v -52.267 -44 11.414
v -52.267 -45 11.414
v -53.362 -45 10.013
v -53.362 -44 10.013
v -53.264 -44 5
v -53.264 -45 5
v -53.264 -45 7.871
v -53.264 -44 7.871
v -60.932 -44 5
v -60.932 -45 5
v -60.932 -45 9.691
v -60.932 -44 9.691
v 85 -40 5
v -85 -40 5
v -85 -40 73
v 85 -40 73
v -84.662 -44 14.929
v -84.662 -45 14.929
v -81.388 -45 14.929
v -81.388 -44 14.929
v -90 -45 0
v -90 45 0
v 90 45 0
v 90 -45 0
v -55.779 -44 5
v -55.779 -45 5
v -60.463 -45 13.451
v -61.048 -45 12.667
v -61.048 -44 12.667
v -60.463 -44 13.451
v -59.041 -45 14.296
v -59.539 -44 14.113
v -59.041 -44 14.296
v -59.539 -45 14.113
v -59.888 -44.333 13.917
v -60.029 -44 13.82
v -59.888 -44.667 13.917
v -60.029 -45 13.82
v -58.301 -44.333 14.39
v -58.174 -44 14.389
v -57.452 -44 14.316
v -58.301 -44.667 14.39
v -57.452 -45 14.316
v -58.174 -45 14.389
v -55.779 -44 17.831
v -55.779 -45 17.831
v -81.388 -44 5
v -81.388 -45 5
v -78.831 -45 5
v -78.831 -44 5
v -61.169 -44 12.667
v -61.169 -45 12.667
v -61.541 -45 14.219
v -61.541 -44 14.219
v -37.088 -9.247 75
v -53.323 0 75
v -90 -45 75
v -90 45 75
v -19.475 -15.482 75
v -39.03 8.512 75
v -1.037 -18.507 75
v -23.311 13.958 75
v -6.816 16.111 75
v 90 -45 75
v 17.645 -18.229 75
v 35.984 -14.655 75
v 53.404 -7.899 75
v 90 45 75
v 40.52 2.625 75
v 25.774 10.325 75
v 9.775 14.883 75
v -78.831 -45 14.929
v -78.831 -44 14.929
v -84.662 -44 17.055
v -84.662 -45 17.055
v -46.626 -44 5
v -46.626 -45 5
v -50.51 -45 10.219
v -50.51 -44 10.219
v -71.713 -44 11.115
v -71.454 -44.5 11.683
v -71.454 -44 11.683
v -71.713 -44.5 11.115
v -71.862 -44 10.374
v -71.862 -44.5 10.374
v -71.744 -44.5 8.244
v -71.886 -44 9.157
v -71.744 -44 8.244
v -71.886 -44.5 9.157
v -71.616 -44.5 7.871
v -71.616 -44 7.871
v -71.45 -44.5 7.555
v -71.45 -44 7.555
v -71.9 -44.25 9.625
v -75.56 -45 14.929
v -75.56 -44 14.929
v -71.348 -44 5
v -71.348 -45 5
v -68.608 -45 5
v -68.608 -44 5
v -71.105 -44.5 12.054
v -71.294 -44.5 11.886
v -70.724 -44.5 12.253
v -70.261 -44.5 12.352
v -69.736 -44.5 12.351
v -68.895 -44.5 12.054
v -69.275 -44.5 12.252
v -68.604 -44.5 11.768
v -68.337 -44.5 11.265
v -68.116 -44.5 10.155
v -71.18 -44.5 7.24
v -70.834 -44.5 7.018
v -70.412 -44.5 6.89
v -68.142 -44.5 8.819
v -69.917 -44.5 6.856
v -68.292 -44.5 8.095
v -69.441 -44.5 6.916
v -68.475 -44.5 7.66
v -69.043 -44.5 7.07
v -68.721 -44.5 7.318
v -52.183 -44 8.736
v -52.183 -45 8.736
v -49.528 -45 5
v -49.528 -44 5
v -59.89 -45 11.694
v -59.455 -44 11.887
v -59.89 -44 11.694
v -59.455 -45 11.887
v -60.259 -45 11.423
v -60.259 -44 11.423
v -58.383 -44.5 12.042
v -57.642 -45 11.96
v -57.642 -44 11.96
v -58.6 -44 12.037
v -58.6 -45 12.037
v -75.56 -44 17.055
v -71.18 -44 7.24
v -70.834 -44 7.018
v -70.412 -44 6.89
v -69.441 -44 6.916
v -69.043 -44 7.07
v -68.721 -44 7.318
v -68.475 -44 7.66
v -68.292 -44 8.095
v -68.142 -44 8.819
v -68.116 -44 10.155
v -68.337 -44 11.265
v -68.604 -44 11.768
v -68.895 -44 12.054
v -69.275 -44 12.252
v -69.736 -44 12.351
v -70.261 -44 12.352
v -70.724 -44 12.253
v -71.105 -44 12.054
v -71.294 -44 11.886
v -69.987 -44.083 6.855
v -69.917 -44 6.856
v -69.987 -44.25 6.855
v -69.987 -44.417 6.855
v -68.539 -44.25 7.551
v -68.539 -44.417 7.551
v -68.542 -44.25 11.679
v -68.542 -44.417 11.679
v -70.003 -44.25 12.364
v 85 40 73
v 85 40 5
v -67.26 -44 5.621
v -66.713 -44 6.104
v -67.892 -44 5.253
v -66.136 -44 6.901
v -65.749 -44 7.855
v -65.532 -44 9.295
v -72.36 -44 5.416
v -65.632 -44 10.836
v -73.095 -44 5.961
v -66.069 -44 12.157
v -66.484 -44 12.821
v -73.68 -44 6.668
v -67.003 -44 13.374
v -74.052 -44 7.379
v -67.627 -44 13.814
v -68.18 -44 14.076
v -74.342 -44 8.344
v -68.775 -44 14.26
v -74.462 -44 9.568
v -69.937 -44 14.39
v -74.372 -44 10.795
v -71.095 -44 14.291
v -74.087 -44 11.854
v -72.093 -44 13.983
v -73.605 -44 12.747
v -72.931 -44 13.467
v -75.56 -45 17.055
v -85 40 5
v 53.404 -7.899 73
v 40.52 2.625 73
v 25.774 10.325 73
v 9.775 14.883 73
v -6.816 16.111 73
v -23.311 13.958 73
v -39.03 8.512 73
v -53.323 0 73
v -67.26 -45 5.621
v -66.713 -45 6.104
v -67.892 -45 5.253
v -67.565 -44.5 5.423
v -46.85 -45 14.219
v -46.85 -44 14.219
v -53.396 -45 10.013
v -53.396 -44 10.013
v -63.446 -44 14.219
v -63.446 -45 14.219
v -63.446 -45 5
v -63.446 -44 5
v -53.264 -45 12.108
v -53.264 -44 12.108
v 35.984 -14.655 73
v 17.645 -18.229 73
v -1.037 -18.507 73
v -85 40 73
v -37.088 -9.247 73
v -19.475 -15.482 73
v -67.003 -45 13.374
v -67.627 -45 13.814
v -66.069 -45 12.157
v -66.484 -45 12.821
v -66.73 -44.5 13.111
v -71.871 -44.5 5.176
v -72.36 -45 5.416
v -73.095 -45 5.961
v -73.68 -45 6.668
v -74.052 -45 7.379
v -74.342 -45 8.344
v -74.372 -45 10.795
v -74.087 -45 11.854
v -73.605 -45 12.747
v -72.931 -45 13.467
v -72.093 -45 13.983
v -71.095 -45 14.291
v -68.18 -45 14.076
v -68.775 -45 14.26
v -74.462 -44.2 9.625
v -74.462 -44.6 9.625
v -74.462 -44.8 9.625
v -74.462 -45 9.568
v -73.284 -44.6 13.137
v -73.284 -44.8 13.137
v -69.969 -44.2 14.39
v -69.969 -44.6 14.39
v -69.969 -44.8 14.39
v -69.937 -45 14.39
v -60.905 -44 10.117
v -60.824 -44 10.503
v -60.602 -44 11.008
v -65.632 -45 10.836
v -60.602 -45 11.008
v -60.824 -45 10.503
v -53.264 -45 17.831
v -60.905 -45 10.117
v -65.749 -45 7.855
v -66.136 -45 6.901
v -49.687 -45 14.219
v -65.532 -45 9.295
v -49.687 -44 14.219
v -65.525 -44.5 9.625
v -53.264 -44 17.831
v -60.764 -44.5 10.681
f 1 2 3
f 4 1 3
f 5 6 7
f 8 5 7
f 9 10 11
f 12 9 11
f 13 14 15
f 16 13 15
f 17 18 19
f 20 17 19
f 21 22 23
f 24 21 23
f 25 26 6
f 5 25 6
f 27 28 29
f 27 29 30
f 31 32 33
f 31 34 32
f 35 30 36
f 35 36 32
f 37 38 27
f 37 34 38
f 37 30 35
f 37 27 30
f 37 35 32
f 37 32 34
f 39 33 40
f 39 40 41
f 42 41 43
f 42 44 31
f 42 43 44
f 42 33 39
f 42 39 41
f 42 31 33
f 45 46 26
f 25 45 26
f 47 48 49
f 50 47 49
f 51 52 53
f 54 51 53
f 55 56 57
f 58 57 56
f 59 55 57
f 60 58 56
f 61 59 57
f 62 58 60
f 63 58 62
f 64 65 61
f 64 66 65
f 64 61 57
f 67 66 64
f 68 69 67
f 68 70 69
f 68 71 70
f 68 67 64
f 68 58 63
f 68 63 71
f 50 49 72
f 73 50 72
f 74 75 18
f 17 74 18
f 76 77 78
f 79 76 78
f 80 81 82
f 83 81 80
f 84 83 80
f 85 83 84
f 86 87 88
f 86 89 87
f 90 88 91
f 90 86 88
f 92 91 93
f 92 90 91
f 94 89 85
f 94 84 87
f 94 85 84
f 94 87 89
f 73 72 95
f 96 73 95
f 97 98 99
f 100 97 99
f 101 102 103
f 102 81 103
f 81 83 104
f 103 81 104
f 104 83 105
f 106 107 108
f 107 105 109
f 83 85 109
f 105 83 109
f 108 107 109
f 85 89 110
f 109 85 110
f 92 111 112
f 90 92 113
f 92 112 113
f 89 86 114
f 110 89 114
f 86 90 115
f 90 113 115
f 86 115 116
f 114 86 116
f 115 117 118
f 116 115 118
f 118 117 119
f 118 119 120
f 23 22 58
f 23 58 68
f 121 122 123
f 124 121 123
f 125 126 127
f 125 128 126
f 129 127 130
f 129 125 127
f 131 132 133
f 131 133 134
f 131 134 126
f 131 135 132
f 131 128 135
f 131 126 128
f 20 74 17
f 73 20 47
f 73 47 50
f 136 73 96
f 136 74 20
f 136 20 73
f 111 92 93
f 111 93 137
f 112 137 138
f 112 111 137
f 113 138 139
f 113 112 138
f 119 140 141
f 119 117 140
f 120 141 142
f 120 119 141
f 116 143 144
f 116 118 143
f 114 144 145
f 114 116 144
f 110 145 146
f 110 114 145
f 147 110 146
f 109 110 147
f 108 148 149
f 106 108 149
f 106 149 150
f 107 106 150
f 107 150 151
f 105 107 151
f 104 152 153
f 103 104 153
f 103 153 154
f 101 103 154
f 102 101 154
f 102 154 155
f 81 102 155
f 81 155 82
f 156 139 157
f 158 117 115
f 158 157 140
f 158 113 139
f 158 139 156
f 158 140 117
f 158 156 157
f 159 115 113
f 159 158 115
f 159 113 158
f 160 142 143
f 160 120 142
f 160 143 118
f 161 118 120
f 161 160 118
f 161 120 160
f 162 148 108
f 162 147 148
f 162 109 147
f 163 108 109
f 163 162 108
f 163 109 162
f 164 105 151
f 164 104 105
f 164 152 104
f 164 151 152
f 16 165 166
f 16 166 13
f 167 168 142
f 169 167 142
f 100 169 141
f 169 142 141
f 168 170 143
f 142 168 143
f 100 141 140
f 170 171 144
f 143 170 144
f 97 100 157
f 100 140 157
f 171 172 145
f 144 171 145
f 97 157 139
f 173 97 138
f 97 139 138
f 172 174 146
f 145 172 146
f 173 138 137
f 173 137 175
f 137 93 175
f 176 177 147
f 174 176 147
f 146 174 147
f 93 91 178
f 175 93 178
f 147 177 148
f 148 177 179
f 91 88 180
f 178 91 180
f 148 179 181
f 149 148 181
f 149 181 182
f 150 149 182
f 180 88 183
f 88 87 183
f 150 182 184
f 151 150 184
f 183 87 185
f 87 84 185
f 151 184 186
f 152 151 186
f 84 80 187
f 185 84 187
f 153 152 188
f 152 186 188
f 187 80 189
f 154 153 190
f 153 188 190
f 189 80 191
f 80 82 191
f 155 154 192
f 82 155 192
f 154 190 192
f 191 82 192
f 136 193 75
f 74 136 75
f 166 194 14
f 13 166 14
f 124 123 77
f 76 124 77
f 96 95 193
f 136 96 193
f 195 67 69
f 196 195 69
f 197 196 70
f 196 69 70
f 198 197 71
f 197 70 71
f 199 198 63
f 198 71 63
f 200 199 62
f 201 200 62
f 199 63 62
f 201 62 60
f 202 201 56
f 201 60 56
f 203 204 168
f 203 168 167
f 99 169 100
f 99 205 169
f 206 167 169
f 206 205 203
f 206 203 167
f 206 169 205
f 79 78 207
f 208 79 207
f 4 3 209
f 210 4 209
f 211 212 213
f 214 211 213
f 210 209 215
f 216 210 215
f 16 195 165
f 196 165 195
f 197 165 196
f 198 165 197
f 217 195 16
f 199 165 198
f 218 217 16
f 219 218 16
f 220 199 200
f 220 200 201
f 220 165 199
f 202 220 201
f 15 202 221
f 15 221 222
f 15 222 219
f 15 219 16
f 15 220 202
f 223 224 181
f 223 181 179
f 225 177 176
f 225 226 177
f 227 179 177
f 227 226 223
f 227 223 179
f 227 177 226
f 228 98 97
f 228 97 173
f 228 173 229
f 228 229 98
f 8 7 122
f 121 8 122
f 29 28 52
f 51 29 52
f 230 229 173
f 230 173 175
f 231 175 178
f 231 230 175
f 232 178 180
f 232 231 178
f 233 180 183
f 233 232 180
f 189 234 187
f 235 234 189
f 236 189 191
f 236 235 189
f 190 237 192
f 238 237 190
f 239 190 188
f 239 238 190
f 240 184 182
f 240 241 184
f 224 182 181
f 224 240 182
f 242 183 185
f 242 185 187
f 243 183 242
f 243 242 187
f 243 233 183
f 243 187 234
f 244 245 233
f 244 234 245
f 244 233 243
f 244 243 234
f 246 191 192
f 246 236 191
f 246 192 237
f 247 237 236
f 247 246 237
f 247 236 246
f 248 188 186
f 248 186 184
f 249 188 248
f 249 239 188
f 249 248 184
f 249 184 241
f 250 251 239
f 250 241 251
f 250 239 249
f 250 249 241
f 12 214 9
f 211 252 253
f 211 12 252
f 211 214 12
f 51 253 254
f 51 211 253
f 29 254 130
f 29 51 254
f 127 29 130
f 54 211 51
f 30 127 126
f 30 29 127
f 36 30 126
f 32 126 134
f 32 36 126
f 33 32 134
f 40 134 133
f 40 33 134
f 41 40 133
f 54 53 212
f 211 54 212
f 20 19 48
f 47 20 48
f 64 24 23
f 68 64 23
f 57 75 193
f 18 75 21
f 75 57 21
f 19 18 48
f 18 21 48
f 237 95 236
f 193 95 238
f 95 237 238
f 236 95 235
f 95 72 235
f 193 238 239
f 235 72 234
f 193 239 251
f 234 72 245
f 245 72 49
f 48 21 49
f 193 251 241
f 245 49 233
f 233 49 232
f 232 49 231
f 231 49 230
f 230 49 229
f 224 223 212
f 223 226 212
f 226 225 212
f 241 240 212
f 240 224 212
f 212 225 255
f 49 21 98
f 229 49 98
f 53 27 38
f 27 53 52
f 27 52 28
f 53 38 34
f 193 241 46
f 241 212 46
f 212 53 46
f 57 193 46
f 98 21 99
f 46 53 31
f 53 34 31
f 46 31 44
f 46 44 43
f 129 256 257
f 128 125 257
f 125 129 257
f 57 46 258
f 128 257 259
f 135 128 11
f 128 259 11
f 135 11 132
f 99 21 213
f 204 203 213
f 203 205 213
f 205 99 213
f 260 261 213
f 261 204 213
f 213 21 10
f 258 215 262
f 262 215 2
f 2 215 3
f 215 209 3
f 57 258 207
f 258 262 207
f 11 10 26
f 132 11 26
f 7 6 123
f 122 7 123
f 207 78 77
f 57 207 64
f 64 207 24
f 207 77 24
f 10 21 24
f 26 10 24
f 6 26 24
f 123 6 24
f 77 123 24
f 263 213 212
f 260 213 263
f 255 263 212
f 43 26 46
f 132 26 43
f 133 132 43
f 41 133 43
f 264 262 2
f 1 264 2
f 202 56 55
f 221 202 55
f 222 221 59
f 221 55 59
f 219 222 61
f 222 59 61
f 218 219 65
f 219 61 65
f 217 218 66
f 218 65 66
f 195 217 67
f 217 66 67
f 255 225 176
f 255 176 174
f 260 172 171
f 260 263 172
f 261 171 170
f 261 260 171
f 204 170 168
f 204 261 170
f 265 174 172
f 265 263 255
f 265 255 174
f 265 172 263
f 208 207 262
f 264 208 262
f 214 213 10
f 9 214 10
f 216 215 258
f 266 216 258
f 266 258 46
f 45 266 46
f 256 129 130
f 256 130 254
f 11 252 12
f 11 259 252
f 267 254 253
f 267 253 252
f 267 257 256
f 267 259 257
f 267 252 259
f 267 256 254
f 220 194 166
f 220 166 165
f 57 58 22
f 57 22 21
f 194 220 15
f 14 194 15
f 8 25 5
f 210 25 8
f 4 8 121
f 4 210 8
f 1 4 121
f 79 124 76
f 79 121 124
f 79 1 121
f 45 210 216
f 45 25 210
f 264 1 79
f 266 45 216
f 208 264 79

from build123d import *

# Parameters (mm, degrees)
F0_W      = 180
F0_H      = 90
F1_DEPTH  = 75
F2_W      = 80
F2_H      = 68
F3_DEPTH  = 175
F4_W      = 80
F4_H      = 68
F5_DEPTH  = 5
F7_DEPTH  = 25
F9_DEPTH  = 1
F10_DEPTH = 0.5


with BuildPart() as f1:
    # F0 (on Top) → F1 (new body)
    with BuildSketch(Plane.XY):
        Rectangle(F0_W, F0_H)
    extrude(amount=F1_DEPTH)

    # F2 (on face) → F3 (cut)
    with BuildSketch(Plane(origin=(-90, 0, 0), x_dir=(0, -1, 0), z_dir=(-1, 0, 0))):
        with Locations((0, 39)):
            Rectangle(F2_W, F2_H)
    extrude(amount=-F3_DEPTH, mode=Mode.SUBTRACT)

    # F4 (on face) → F5 (join)
    with BuildSketch(Plane(origin=(-90, 0, 0), x_dir=(0, -1, 0), z_dir=(-1, 0, 0))):
        with Locations((0, 39)):
            Rectangle(F4_W, F4_H)
    extrude(amount=-F5_DEPTH)

    # F6 (on face) → F7 (cut, symmetric)
    with BuildSketch(Plane.XY.offset(75)):
        with BuildLine():
            ThreePointArc((53.4038208425, -7.8985784203), (1.5108137294, 15.9196343033), (-53.3230871735, 0))
            ThreePointArc((-53.3230871735, 0), (-1.0370293111, -18.5072454911), (53.4038208425, -7.8985784203))
        make_face()
    extrude(amount=F7_DEPTH, both=True, mode=Mode.SUBTRACT)

    # F8 (on face) → F9 (cut)
    with BuildSketch(Plane.XZ.offset(45)):
        Polygon((-81.387918066, 14.9286104324), (-81.387918066, 5), (-78.8312283214, 5), (-78.8312283214, 14.9286104324), (-75.5595097627, 14.9286104324), (-75.5595097627, 17.0552274955), (-84.6622751074, 17.0552274955), (-84.6622751074, 14.9286104324), align=None)
        with BuildLine():
            add(Edge.make_bspline(
                [(-71.3481548896, 5), (-71.8881241204, 5.1447529863), (-72.3603494786, 5.4155610266)],
                knots=[0.5345224838, 0.5345224838, 0.5345224838, 1, 1, 1], degree=2))
            Line((-71.3481548896, 5), (-68.6078073449, 5))
            add(Edge.make_bspline(
                [(-66.7126772409, 6.1042050135), (-67.4705184641, 5.2933149046), (-68.6078073449, 5)],
                knots=[0, 0, 0, 0.6382803275, 0.6382803275, 0.6382803275], degree=2))
            add(Edge.make_bspline(
                [(-65.525360022, 9.6252601882), (-65.525360022, 7.3746344377), (-66.7126772409, 6.1042050135)],
                knots=[0, 0, 0, 1, 1, 1], degree=2))
            add(Edge.make_bspline(
                [(-66.06888746, 12.156884347), (-65.525360022, 11.0764256779), (-65.525360022, 9.6252601882)],
                knots=[0, 0, 0, 1, 1, 1], degree=2))
            add(Edge.make_bspline(
                [(-67.6269114994, 13.813851488), (-66.6124148979, 13.2373430162), (-66.06888746, 12.156884347)],
                knots=[0, 0, 0, 1, 1, 1], degree=2))
            add(Edge.make_bspline(
                [(-69.9685649032, 14.3903599599), (-68.6414081008, 14.3903599599), (-67.6269114994, 13.813851488)],
                knots=[0, 0, 0, 1, 1, 1], degree=2))
            add(Edge.make_bspline(
                [(-73.2838184266, 13.1370806733), (-72.1057358972, 14.3903599599), (-69.9685649032, 14.3903599599)],
                knots=[0, 0, 0, 1, 1, 1], degree=2))
            add(Edge.make_bspline(
                [(-74.461900956, 9.6252601882), (-74.461900956, 11.8838013867), (-73.2838184266, 13.1370806733)],
                knots=[0, 0, 0, 1, 1, 1], degree=2))
            add(Edge.make_bspline(
                [(-73.918373518, 7.0857205811), (-74.461900956, 8.1740946984), (-74.461900956, 9.6252601882)],
                knots=[0, 0, 0, 1, 1, 1], degree=2))
            add(Edge.make_bspline(
                [(-72.3603494786, 5.4155610266), (-73.37484608, 5.9973464638), (-73.918373518, 7.0857205811)],
                knots=[0, 0, 0, 1, 1, 1], degree=2))
        make_face()
        with BuildLine():
            add(Edge.make_bspline(
                [(-71.8999342459, 9.6252601882), (-71.8999342459, 8.2558876624), (-71.4500729441, 7.5553705033)],
                knots=[0, 0, 0, 1, 1, 1], degree=2))
            add(Edge.make_bspline(
                [(-71.4540306682, 11.6832767009), (-71.8999342459, 11.002548162), (-71.8999342459, 9.6252601882)],
                knots=[0, 0, 0, 1, 1, 1], degree=2))
            add(Edge.make_bspline(
                [(-70.0028651785, 12.3640052397), (-71.0081270904, 12.3640052397), (-71.4540306682, 11.6832767009)],
                knots=[0, 0, 0, 1, 1, 1], degree=2))
            add(Edge.make_bspline(
                [(-68.5424649993, 11.6793189768), (-68.9870493357, 12.3640052397), (-70.0028651785, 12.3640052397)],
                knots=[0, 0, 0, 1, 1, 1], degree=2))
            add(Edge.make_bspline(
                [(-68.0978806629, 9.6252601882), (-68.0978806629, 10.9946327139), (-68.5424649993, 11.6793189768)],
                knots=[0, 0, 0, 1, 1, 1], degree=2))
            add(Edge.make_bspline(
                [(-68.5385072752, 7.5514127792), (-68.0978806629, 8.2479722143), (-68.0978806629, 9.6252601882)],
                knots=[0, 0, 0, 1, 1, 1], degree=2))
            add(Edge.make_bspline(
                [(-69.9870342822, 6.8548533441), (-68.9791338875, 6.8548533441), (-68.5385072752, 7.5514127792)],
                knots=[0, 0, 0, 1, 1, 1], degree=2))
            add(Edge.make_bspline(
                [(-71.4500729441, 7.5553705033), (-71.0002116423, 6.8548533441), (-69.9870342822, 6.8548533441)],
                knots=[0, 0, 0, 1, 1, 1], degree=2))
        make_face(mode=Mode.SUBTRACT)
        with BuildLine():
            Line((-63.4462356476, 5), (-60.9317616263, 5))
            Line((-60.9317616263, 5), (-60.9317616263, 9.6912222559))
            add(Edge.make_bspline(
                [(-60.2589485356, 11.4233861541), (-60.9317616263, 10.8046619589), (-60.9317616263, 9.6912222559)],
                knots=[0, 0, 0, 1, 1, 1], degree=2))
            add(Edge.make_bspline(
                [(-58.3829873298, 12.0421103492), (-59.586135445, 12.0421103492), (-60.2589485356, 11.4233861541)],
                knots=[0, 0, 0, 1, 1, 1], degree=2))
            add(Edge.make_bspline(
                [(-57.6415736887, 11.9603173853), (-57.9476376829, 12.0421103492), (-58.3829873298, 12.0421103492)],
                knots=[0, 0, 0, 1, 1, 1], degree=2))
            Line((-57.6415736887, 11.9603173853), (-57.4516029337, 14.316482444))
            add(Edge.make_bspline(
                [(-58.3011943659, 14.3903599599), (-57.7893287204, 14.3903599599), (-57.4516029337, 14.316482444)],
                knots=[0, 0, 0, 1, 1, 1], degree=2))
            add(Edge.make_bspline(
                [(-59.8882417151, 13.9167523137), (-59.1587012462, 14.3903599599), (-58.3011943659, 14.3903599599)],
                knots=[0, 0, 0, 1, 1, 1], degree=2))
            add(Edge.make_bspline(
                [(-61.0478548655, 12.6674307512), (-60.617782184, 13.4431446675), (-59.8882417151, 13.9167523137)],
                knots=[0, 0, 0, 1, 1, 1], degree=2))
            Line((-61.0478548655, 12.6674307512), (-61.1692250701, 12.6674307512))
            Line((-61.1692250701, 12.6674307512), (-61.541251132, 14.2188585838))
            Line((-61.541251132, 14.2188585838), (-63.4462356476, 14.2188585838))
            Line((-63.4462356476, 14.2188585838), (-63.4462356476, 5))
        make_face()
        Polygon((-49.5282393598, 5), (-46.6259083804, 5), (-50.5097549274, 10.2189187976), (-46.8501794106, 14.2188585838), (-49.6865483223, 14.2188585838), (-52.2669844113, 11.4141514646), (-53.3619547354, 10.0131171463), (-53.3962550106, 10.0131171463), (-53.2643308752, 12.1080724169), (-53.2643308752, 17.8309414119), (-55.7788048965, 17.8309414119), (-55.7788048965, 5), (-53.2643308752, 5), (-53.2643308752, 7.8706691869), (-52.1825529647, 8.7360915154), align=None)
    extrude(amount=-F9_DEPTH, mode=Mode.SUBTRACT)

    # F10 (cut): a face of the model
    f10_faces = [f1.faces().sort_by_distance(p)[0] for p in [
        (-69.997731823, -45, 9.6131266582),
    ]]
    extrude(f10_faces, amount=-F10_DEPTH, mode=Mode.SUBTRACT)


solid = f1.part
